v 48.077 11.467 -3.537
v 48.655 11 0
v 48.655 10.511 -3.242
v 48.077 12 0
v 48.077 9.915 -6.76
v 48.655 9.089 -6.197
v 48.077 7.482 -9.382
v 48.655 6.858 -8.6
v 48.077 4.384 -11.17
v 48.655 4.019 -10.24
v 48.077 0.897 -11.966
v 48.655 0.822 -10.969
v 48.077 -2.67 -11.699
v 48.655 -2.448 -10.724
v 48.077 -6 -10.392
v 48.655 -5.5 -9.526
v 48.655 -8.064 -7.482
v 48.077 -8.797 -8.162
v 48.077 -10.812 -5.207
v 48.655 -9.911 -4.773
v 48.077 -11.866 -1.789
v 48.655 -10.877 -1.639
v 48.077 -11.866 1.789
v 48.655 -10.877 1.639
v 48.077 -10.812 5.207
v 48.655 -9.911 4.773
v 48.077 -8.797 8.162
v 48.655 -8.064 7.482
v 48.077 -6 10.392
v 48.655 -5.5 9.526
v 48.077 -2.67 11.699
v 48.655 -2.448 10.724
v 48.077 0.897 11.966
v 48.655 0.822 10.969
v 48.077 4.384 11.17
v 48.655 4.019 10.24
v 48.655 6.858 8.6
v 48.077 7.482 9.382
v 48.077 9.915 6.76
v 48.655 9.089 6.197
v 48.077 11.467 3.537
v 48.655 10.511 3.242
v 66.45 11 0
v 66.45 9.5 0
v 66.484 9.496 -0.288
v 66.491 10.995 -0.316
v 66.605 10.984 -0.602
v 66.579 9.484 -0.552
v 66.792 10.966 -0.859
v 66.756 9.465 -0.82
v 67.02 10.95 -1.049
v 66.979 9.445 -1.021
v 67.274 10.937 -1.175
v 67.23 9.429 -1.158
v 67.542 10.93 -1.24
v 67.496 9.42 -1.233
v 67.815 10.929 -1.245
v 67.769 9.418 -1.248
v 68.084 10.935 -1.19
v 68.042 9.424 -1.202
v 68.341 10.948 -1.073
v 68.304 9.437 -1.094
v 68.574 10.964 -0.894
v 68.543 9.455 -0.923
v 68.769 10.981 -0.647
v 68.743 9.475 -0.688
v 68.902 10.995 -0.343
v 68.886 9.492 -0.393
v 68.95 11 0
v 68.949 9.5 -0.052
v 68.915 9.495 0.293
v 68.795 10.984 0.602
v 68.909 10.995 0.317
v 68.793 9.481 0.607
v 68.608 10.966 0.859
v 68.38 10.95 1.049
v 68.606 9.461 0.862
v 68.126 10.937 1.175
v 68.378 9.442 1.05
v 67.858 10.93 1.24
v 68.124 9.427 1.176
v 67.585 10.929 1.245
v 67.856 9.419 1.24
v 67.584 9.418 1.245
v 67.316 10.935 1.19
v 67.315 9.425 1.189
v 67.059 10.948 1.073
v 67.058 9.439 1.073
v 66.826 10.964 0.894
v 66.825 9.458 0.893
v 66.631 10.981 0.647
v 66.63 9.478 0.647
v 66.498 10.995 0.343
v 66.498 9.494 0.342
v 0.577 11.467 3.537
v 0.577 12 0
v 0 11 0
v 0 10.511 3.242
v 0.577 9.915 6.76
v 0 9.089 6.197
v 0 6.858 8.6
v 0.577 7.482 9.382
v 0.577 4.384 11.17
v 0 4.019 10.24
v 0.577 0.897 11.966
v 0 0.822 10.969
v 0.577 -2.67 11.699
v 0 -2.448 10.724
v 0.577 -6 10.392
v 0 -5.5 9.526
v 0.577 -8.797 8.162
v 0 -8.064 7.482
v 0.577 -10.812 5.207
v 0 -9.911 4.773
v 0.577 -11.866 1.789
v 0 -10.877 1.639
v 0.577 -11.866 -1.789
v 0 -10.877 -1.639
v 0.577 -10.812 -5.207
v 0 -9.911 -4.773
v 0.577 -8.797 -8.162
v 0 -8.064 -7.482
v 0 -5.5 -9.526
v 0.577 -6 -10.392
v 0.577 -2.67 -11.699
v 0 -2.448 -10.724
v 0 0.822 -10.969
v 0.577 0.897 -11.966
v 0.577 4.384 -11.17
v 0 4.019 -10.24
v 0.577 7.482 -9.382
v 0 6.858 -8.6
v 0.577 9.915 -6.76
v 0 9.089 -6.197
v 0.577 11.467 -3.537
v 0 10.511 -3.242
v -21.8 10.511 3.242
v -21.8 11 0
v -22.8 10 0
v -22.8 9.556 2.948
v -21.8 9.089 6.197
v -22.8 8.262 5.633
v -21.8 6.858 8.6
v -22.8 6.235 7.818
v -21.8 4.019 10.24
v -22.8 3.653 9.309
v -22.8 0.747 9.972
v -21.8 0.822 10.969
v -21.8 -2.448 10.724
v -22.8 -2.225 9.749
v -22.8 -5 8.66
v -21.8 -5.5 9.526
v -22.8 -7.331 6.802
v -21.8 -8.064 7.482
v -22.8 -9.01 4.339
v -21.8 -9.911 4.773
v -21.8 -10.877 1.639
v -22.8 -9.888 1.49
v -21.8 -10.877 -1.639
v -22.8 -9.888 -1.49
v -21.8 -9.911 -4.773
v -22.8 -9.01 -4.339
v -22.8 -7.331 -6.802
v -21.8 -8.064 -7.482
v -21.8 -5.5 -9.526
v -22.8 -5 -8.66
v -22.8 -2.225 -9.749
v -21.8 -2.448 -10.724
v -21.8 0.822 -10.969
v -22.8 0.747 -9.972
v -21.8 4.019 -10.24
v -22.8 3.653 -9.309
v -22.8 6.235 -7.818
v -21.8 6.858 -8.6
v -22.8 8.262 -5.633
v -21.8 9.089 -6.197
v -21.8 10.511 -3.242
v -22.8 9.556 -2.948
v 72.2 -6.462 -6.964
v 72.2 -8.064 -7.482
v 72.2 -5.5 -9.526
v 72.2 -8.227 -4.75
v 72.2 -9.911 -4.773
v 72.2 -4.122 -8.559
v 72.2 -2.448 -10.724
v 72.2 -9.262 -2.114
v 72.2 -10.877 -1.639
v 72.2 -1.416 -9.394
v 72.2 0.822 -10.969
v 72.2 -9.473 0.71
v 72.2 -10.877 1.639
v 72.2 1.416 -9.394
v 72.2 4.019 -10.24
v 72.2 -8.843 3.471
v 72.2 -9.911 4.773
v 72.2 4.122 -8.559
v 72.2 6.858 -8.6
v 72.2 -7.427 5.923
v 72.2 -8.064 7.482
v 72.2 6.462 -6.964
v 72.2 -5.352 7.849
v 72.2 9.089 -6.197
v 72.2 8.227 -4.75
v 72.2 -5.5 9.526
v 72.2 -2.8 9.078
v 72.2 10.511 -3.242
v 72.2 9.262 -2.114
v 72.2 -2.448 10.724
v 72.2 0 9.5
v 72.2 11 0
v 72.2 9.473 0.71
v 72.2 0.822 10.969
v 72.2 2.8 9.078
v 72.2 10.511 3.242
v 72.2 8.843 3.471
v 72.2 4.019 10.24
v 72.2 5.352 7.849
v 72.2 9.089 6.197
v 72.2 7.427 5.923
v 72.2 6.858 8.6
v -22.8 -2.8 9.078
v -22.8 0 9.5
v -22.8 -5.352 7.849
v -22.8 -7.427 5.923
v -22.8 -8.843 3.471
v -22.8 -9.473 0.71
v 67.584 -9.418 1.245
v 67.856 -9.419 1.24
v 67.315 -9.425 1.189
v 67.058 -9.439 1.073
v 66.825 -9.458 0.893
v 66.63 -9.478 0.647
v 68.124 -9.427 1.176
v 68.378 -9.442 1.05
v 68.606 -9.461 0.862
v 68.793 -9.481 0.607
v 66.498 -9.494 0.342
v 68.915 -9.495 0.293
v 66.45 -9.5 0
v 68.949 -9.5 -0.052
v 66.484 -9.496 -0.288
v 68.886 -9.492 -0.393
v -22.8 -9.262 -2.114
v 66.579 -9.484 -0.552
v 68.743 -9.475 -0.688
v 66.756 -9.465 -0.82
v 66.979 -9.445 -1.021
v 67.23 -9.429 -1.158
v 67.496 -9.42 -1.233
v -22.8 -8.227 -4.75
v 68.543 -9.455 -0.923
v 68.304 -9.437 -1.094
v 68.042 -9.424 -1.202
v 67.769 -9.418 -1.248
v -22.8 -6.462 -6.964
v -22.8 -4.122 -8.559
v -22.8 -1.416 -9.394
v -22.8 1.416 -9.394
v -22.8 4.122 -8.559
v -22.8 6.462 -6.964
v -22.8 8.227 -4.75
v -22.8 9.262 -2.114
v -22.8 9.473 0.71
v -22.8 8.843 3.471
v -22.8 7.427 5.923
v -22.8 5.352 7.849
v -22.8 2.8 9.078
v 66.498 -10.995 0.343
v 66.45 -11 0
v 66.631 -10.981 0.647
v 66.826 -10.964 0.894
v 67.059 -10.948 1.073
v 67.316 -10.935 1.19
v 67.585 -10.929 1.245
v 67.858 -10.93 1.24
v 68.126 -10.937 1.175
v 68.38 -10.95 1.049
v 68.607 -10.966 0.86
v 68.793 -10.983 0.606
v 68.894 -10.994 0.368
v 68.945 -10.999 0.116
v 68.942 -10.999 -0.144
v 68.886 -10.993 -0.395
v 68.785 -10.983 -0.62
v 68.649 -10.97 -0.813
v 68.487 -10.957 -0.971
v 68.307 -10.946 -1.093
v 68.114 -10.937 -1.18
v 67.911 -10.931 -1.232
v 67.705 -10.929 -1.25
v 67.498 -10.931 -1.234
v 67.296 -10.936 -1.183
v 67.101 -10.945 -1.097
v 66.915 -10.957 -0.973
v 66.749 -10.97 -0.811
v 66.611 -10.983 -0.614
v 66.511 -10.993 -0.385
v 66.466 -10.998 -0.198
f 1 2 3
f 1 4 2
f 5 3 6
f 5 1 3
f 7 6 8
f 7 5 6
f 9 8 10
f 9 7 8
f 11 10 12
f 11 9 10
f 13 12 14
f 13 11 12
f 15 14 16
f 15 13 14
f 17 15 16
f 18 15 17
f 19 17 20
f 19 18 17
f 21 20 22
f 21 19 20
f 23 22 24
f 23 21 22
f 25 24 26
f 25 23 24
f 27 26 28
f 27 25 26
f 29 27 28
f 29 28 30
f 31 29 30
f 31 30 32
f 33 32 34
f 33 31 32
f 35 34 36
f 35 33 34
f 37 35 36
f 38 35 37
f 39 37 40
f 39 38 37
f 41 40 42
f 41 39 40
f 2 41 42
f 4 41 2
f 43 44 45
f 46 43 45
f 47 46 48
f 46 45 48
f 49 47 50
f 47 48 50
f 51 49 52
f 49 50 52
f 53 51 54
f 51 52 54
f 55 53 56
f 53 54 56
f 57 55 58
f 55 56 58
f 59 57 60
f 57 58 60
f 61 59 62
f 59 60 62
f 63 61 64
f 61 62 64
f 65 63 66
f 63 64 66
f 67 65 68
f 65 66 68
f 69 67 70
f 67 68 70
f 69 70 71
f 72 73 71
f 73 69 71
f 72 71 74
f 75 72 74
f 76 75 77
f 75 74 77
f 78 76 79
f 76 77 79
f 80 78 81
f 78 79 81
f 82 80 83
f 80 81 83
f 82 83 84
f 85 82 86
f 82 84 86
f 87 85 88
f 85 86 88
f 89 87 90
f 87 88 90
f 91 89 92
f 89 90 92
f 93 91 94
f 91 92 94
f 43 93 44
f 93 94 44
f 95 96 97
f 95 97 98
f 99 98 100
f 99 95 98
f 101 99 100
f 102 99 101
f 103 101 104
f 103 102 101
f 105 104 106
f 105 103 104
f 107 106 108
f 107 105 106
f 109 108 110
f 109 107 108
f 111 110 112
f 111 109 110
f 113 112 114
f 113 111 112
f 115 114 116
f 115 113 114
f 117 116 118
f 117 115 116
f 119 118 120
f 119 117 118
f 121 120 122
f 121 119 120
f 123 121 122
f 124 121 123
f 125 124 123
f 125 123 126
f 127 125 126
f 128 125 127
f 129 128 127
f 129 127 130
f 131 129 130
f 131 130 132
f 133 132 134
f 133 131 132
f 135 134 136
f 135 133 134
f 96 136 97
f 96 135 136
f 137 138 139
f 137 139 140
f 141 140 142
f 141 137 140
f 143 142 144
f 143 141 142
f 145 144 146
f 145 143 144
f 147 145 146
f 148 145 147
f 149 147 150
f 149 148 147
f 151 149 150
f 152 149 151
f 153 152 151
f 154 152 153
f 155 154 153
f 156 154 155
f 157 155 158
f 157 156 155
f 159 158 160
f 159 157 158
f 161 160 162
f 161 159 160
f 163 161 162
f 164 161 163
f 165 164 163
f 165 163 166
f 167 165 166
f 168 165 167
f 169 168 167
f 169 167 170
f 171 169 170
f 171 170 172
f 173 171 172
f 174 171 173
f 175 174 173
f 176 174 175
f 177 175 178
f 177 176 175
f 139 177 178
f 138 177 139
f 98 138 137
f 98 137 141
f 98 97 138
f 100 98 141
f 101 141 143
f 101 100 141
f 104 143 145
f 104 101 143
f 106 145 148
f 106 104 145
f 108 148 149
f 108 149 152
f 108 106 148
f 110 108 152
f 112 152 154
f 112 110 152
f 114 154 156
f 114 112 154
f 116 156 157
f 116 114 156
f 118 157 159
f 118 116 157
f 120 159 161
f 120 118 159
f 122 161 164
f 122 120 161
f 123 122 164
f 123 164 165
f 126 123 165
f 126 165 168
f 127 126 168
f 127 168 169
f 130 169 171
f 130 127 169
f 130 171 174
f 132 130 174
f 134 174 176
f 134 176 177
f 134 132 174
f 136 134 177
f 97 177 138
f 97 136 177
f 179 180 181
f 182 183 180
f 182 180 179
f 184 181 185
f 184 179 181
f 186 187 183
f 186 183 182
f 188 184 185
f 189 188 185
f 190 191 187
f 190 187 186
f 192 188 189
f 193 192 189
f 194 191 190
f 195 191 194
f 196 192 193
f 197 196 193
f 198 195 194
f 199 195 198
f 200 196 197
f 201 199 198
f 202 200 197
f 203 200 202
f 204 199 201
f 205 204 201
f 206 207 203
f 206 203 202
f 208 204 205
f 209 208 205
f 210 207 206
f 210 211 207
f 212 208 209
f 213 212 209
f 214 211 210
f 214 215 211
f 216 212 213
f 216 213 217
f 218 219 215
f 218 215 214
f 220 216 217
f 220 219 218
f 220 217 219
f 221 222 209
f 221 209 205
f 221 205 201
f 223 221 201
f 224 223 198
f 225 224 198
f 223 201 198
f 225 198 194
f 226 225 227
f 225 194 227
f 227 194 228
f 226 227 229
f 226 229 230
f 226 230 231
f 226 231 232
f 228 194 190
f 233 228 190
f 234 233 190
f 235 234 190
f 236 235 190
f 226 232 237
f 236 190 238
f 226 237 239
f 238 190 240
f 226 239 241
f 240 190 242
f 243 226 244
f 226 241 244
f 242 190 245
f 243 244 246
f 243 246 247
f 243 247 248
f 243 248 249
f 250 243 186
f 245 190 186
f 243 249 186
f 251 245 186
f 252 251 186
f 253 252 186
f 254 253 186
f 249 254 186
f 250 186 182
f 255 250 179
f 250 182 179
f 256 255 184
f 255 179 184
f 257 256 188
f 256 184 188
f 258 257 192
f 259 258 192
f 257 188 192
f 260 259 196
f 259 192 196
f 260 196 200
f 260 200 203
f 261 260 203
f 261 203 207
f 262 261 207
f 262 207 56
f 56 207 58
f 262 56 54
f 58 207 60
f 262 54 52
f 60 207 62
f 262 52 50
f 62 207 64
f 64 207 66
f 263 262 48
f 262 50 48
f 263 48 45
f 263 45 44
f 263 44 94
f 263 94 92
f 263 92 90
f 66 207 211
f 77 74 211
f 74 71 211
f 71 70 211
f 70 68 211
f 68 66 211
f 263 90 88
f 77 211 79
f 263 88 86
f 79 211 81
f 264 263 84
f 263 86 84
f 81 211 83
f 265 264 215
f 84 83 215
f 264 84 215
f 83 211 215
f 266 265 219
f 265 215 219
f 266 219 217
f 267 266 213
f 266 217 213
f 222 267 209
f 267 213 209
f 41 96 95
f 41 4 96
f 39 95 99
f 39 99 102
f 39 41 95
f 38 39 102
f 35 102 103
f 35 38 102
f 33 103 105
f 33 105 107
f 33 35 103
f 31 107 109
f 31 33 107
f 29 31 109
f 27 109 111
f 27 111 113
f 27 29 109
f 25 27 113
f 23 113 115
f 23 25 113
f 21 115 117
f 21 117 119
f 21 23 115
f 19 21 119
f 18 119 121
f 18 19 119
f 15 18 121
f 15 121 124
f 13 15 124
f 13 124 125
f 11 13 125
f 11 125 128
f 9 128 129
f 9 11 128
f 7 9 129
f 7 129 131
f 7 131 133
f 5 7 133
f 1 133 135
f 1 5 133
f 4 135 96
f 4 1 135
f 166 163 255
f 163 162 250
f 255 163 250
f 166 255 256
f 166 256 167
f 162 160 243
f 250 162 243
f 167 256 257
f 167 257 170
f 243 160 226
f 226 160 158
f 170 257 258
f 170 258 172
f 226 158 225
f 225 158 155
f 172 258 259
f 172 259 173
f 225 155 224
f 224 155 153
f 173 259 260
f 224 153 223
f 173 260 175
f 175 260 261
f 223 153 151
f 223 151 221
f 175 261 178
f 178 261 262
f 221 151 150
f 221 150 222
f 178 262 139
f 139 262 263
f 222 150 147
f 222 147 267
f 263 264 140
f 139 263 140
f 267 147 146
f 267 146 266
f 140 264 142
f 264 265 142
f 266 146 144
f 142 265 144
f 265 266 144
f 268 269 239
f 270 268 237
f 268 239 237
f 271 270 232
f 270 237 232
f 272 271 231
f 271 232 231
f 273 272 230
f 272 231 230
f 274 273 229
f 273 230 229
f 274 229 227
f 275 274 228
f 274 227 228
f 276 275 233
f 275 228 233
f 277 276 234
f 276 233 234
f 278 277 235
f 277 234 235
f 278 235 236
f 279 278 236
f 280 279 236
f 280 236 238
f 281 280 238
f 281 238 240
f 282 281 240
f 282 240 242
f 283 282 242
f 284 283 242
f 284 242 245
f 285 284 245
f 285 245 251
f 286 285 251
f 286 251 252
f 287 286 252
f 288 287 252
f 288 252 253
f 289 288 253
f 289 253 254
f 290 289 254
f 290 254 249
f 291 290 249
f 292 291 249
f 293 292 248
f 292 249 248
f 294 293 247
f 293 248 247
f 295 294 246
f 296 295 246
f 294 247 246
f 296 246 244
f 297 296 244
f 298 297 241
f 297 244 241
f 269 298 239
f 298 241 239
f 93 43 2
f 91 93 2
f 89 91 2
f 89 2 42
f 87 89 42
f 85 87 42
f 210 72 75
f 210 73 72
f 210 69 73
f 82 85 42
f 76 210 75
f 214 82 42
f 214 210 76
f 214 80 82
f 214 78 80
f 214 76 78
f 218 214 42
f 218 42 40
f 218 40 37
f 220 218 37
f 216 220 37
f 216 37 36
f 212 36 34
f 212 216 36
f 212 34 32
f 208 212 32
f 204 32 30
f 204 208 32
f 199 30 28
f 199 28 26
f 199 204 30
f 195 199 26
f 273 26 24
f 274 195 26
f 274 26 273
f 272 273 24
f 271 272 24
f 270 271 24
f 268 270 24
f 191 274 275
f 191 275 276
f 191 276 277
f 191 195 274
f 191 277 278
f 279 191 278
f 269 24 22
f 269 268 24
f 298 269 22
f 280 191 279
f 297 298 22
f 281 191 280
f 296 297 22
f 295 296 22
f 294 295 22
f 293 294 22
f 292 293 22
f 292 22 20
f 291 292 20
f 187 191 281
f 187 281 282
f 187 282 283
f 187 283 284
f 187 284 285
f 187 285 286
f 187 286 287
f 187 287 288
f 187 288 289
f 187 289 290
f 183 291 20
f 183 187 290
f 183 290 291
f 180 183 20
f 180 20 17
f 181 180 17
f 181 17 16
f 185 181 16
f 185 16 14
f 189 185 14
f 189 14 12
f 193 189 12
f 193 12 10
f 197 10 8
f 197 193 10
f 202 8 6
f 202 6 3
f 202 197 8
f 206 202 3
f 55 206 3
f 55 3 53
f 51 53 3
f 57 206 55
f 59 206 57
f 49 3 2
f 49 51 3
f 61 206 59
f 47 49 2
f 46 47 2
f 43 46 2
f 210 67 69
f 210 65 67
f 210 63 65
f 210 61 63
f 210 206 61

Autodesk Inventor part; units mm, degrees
ref_plane "YZ Plane" through (0, 0, 0) normal (1, 0, 0) x (0, 1, 0)
ref_plane "XZ Plane" through (0, 0, 0) normal (0, 1, 0) x (-1, 0, 0)
ref_plane "XY Plane" through (0, 0, 0) normal (0, 0, 1) x (1, 0, 0)
sketch "Profile" plane through (0, 0, 0) normal (0, 0, 1) x (1, 0, 0)
  line L0 (-22.8, 0) -> (-22.8, 11)
  line L1 (-22.8, 11) -> (0, 11)
  line L2 (0, 11) -> (0.5774, 12)
  line L3 (0.5774, 12) -> (48.0774, 12)
  line L4 (48.0774, 12) -> (48.6547, 11)
  line L5 (48.6547, 11) -> (72.2, 11)
  line L6 (72.2, 11) -> (72.2, 0)
  line L7 (-22.8, 0) -> (0, 0)
  line L8 (0, 0) -> (0, 9)
  line L9 (0, 9) -> (64.2, 9)
  line L10 (64.2, 9) -> (64.2, 0)
  line L11 (64.2, 0) -> (72.2, 0)
  line L12 (-41.8, 0) -> (91.2, 0) construction
  line L13 (0, 11) -> (0, 9) construction
  dimension "BodyLength" = 95
  dimension "d1" = 11
  dimension "d3" = 120
  dimension "d4" = 120
  dimension "d5" = 47.5
  dimension "d6" = 22.8
  dimension "d16" = 8
  dimension "d29" = 1
  dimension "d30" = 9
revolve "ProfileRevolveFeature" add sketch "Profile" angle 360 about axis through (-10, 0, 0) along (1, 0, 0)
sketch "InsideHole" plane through (-22.8, 0, 0) normal (-1, 0, 0) x (0, 0, 1)
  circle A0 centre (0, 0) radius 9 construction
hole "InsideHoleFeature" at (-22.8, 0, 0) direction (1, 0, 0) diameter 19 end through all
chamfer "EndChamferFeature" distance 1 angle 45 1 edges at (-22.8, -11, 0)
sketch "CapMountHole" plane through (0, 0, 0) normal (0, 1, 0) x (-1, 0, 0)
  line L0 (-72.2, 11) -> (-72.2, -11) construction
  line L1 (15.2, 0) -> (-91.2, 0) construction
  circle A0 centre (-67.7, 0) radius 1.25
  point P0 (0, 0)
  dimension "d31" = 4.5
  dimension "d39" = 2.5
extrude "CapMountHoleFeature" cut sketch "CapMountHole" along normal through all both and the other way through all
equation "\"d5\" = 0.5 * BodyLength"
equation "\"d6\" = 0.24 * BodyLength"
properties part number "BackPair1PistonBody"
